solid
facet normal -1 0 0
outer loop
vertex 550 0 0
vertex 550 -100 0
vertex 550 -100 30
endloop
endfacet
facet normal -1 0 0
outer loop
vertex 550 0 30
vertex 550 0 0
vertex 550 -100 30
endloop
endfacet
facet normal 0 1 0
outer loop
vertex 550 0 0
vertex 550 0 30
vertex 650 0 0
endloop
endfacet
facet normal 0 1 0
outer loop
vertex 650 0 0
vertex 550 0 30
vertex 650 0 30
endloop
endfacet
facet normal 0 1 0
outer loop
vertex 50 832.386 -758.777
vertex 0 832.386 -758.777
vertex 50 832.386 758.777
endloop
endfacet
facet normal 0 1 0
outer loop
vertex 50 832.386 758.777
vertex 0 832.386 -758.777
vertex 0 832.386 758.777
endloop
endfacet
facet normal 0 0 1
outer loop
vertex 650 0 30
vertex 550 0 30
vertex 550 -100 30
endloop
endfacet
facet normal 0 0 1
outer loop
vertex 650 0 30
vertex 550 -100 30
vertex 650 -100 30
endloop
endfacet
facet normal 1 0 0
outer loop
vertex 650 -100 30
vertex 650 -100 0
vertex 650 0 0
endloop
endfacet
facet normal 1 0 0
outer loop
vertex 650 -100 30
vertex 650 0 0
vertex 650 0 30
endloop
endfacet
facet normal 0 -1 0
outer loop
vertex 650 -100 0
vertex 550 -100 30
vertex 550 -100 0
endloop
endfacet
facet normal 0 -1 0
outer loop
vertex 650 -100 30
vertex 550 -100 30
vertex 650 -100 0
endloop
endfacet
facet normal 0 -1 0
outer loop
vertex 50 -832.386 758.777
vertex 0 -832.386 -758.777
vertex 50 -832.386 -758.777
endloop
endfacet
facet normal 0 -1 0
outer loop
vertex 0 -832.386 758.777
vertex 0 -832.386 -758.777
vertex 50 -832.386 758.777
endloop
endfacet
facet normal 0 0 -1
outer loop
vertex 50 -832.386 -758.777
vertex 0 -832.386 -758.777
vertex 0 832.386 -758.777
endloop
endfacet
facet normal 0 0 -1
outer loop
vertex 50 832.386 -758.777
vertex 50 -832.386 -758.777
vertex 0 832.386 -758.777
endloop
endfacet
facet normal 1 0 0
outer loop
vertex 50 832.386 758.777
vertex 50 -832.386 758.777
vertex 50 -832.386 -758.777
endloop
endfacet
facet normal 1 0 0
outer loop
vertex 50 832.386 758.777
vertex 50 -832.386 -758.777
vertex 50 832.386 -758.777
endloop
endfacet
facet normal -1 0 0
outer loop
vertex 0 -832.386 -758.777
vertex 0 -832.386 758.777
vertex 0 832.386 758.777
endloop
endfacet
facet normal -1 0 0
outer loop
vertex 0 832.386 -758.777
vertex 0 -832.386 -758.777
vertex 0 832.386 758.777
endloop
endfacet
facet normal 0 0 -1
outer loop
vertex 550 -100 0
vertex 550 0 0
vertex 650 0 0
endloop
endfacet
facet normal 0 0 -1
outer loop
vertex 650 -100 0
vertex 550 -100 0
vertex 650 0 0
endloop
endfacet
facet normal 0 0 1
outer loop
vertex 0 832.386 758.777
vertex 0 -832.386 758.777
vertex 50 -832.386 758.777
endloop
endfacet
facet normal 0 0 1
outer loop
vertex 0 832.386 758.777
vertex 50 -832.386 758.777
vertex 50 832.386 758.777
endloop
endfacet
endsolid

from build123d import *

# Parameters (mm, degrees)
F0_W     = 1664.771676
F0_H     = 1517.554998
F1_DEPTH = 50
F2_W     = 100
F2_H     = 30
F3_DEPTH = 100


with BuildPart() as f1:
    # F0 (on Right) → F1 (new body)
    with BuildSketch(Plane.YZ):
        Rectangle(F0_W, F0_H)
    extrude(amount=F1_DEPTH)


with BuildPart() as f3:
    # F2 (on Front) → F3 (new body)
    with BuildSketch(Plane.XZ):
        with Locations((600, 15)):
            Rectangle(F2_W, F2_H)
    extrude(amount=F3_DEPTH)


solid = Compound([f1.part, f3.part])
